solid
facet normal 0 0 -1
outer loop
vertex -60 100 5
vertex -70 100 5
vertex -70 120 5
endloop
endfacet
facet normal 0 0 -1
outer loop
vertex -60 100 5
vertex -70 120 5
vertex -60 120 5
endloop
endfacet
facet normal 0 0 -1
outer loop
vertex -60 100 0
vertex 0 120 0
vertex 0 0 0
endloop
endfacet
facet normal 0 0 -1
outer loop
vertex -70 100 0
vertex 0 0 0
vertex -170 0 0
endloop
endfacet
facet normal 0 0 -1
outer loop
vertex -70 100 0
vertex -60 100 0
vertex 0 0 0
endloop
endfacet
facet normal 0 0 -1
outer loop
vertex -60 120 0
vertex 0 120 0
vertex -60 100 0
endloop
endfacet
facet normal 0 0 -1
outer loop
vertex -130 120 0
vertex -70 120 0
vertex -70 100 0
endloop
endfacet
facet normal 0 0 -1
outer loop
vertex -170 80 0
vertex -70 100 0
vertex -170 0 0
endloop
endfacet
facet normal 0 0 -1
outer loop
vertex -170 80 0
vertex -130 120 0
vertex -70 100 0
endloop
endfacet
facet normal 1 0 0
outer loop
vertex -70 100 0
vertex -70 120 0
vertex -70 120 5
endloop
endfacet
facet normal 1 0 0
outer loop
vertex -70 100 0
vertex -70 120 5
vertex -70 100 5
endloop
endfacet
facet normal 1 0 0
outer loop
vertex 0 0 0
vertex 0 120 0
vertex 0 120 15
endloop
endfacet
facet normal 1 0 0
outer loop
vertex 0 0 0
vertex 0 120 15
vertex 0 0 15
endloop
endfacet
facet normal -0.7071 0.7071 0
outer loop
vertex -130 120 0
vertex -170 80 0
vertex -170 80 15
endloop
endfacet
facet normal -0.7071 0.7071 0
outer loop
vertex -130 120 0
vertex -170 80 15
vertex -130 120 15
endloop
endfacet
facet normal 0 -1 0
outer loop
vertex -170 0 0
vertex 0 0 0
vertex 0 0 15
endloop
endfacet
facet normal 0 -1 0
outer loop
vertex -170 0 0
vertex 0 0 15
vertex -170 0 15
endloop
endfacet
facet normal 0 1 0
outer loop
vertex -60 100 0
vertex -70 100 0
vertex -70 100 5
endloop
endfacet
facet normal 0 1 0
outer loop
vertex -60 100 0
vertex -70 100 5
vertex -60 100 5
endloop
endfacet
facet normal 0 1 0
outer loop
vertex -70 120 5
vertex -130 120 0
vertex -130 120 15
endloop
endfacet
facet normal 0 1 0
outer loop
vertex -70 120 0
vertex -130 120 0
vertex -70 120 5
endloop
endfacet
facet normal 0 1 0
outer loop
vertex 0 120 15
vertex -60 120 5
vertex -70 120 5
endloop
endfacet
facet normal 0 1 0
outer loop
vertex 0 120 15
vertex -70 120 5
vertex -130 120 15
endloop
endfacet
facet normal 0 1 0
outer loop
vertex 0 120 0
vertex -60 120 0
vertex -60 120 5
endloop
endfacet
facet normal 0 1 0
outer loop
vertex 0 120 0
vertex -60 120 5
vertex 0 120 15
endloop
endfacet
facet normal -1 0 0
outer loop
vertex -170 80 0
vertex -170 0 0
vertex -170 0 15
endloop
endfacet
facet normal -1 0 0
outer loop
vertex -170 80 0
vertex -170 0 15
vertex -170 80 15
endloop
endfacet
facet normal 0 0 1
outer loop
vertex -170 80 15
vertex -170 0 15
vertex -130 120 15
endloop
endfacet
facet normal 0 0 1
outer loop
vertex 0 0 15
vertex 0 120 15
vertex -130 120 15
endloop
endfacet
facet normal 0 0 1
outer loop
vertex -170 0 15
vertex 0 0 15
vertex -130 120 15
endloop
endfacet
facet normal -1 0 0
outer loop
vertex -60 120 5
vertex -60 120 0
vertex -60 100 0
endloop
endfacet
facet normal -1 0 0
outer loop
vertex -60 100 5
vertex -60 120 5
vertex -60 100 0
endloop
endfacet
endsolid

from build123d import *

# Parameters (mm, degrees)
PAD_DEPTH    = 15
SKETCH_W     = 10
SKETCH_H     = 25
POCKET_DEPTH = 5


with BuildPart() as part:
    # CopySketch → Pad (new body)
    with BuildSketch(Plane.XY):
        Polygon((-170, 0), (-170, 80), (-130, 120), (0, 120), (0, 0), align=None)
    extrude(amount=PAD_DEPTH)

    # Sketch (on Face6 of Pad) → Pocket (cut)
    with BuildSketch(Plane(origin=(0, 0, 0), x_dir=(1, 0, 0), z_dir=(0, 0, -1))):
        with Locations((-65, -112.5)):
            Rectangle(SKETCH_W, SKETCH_H)
    extrude(amount=-POCKET_DEPTH, mode=Mode.SUBTRACT)


solid = part.part
